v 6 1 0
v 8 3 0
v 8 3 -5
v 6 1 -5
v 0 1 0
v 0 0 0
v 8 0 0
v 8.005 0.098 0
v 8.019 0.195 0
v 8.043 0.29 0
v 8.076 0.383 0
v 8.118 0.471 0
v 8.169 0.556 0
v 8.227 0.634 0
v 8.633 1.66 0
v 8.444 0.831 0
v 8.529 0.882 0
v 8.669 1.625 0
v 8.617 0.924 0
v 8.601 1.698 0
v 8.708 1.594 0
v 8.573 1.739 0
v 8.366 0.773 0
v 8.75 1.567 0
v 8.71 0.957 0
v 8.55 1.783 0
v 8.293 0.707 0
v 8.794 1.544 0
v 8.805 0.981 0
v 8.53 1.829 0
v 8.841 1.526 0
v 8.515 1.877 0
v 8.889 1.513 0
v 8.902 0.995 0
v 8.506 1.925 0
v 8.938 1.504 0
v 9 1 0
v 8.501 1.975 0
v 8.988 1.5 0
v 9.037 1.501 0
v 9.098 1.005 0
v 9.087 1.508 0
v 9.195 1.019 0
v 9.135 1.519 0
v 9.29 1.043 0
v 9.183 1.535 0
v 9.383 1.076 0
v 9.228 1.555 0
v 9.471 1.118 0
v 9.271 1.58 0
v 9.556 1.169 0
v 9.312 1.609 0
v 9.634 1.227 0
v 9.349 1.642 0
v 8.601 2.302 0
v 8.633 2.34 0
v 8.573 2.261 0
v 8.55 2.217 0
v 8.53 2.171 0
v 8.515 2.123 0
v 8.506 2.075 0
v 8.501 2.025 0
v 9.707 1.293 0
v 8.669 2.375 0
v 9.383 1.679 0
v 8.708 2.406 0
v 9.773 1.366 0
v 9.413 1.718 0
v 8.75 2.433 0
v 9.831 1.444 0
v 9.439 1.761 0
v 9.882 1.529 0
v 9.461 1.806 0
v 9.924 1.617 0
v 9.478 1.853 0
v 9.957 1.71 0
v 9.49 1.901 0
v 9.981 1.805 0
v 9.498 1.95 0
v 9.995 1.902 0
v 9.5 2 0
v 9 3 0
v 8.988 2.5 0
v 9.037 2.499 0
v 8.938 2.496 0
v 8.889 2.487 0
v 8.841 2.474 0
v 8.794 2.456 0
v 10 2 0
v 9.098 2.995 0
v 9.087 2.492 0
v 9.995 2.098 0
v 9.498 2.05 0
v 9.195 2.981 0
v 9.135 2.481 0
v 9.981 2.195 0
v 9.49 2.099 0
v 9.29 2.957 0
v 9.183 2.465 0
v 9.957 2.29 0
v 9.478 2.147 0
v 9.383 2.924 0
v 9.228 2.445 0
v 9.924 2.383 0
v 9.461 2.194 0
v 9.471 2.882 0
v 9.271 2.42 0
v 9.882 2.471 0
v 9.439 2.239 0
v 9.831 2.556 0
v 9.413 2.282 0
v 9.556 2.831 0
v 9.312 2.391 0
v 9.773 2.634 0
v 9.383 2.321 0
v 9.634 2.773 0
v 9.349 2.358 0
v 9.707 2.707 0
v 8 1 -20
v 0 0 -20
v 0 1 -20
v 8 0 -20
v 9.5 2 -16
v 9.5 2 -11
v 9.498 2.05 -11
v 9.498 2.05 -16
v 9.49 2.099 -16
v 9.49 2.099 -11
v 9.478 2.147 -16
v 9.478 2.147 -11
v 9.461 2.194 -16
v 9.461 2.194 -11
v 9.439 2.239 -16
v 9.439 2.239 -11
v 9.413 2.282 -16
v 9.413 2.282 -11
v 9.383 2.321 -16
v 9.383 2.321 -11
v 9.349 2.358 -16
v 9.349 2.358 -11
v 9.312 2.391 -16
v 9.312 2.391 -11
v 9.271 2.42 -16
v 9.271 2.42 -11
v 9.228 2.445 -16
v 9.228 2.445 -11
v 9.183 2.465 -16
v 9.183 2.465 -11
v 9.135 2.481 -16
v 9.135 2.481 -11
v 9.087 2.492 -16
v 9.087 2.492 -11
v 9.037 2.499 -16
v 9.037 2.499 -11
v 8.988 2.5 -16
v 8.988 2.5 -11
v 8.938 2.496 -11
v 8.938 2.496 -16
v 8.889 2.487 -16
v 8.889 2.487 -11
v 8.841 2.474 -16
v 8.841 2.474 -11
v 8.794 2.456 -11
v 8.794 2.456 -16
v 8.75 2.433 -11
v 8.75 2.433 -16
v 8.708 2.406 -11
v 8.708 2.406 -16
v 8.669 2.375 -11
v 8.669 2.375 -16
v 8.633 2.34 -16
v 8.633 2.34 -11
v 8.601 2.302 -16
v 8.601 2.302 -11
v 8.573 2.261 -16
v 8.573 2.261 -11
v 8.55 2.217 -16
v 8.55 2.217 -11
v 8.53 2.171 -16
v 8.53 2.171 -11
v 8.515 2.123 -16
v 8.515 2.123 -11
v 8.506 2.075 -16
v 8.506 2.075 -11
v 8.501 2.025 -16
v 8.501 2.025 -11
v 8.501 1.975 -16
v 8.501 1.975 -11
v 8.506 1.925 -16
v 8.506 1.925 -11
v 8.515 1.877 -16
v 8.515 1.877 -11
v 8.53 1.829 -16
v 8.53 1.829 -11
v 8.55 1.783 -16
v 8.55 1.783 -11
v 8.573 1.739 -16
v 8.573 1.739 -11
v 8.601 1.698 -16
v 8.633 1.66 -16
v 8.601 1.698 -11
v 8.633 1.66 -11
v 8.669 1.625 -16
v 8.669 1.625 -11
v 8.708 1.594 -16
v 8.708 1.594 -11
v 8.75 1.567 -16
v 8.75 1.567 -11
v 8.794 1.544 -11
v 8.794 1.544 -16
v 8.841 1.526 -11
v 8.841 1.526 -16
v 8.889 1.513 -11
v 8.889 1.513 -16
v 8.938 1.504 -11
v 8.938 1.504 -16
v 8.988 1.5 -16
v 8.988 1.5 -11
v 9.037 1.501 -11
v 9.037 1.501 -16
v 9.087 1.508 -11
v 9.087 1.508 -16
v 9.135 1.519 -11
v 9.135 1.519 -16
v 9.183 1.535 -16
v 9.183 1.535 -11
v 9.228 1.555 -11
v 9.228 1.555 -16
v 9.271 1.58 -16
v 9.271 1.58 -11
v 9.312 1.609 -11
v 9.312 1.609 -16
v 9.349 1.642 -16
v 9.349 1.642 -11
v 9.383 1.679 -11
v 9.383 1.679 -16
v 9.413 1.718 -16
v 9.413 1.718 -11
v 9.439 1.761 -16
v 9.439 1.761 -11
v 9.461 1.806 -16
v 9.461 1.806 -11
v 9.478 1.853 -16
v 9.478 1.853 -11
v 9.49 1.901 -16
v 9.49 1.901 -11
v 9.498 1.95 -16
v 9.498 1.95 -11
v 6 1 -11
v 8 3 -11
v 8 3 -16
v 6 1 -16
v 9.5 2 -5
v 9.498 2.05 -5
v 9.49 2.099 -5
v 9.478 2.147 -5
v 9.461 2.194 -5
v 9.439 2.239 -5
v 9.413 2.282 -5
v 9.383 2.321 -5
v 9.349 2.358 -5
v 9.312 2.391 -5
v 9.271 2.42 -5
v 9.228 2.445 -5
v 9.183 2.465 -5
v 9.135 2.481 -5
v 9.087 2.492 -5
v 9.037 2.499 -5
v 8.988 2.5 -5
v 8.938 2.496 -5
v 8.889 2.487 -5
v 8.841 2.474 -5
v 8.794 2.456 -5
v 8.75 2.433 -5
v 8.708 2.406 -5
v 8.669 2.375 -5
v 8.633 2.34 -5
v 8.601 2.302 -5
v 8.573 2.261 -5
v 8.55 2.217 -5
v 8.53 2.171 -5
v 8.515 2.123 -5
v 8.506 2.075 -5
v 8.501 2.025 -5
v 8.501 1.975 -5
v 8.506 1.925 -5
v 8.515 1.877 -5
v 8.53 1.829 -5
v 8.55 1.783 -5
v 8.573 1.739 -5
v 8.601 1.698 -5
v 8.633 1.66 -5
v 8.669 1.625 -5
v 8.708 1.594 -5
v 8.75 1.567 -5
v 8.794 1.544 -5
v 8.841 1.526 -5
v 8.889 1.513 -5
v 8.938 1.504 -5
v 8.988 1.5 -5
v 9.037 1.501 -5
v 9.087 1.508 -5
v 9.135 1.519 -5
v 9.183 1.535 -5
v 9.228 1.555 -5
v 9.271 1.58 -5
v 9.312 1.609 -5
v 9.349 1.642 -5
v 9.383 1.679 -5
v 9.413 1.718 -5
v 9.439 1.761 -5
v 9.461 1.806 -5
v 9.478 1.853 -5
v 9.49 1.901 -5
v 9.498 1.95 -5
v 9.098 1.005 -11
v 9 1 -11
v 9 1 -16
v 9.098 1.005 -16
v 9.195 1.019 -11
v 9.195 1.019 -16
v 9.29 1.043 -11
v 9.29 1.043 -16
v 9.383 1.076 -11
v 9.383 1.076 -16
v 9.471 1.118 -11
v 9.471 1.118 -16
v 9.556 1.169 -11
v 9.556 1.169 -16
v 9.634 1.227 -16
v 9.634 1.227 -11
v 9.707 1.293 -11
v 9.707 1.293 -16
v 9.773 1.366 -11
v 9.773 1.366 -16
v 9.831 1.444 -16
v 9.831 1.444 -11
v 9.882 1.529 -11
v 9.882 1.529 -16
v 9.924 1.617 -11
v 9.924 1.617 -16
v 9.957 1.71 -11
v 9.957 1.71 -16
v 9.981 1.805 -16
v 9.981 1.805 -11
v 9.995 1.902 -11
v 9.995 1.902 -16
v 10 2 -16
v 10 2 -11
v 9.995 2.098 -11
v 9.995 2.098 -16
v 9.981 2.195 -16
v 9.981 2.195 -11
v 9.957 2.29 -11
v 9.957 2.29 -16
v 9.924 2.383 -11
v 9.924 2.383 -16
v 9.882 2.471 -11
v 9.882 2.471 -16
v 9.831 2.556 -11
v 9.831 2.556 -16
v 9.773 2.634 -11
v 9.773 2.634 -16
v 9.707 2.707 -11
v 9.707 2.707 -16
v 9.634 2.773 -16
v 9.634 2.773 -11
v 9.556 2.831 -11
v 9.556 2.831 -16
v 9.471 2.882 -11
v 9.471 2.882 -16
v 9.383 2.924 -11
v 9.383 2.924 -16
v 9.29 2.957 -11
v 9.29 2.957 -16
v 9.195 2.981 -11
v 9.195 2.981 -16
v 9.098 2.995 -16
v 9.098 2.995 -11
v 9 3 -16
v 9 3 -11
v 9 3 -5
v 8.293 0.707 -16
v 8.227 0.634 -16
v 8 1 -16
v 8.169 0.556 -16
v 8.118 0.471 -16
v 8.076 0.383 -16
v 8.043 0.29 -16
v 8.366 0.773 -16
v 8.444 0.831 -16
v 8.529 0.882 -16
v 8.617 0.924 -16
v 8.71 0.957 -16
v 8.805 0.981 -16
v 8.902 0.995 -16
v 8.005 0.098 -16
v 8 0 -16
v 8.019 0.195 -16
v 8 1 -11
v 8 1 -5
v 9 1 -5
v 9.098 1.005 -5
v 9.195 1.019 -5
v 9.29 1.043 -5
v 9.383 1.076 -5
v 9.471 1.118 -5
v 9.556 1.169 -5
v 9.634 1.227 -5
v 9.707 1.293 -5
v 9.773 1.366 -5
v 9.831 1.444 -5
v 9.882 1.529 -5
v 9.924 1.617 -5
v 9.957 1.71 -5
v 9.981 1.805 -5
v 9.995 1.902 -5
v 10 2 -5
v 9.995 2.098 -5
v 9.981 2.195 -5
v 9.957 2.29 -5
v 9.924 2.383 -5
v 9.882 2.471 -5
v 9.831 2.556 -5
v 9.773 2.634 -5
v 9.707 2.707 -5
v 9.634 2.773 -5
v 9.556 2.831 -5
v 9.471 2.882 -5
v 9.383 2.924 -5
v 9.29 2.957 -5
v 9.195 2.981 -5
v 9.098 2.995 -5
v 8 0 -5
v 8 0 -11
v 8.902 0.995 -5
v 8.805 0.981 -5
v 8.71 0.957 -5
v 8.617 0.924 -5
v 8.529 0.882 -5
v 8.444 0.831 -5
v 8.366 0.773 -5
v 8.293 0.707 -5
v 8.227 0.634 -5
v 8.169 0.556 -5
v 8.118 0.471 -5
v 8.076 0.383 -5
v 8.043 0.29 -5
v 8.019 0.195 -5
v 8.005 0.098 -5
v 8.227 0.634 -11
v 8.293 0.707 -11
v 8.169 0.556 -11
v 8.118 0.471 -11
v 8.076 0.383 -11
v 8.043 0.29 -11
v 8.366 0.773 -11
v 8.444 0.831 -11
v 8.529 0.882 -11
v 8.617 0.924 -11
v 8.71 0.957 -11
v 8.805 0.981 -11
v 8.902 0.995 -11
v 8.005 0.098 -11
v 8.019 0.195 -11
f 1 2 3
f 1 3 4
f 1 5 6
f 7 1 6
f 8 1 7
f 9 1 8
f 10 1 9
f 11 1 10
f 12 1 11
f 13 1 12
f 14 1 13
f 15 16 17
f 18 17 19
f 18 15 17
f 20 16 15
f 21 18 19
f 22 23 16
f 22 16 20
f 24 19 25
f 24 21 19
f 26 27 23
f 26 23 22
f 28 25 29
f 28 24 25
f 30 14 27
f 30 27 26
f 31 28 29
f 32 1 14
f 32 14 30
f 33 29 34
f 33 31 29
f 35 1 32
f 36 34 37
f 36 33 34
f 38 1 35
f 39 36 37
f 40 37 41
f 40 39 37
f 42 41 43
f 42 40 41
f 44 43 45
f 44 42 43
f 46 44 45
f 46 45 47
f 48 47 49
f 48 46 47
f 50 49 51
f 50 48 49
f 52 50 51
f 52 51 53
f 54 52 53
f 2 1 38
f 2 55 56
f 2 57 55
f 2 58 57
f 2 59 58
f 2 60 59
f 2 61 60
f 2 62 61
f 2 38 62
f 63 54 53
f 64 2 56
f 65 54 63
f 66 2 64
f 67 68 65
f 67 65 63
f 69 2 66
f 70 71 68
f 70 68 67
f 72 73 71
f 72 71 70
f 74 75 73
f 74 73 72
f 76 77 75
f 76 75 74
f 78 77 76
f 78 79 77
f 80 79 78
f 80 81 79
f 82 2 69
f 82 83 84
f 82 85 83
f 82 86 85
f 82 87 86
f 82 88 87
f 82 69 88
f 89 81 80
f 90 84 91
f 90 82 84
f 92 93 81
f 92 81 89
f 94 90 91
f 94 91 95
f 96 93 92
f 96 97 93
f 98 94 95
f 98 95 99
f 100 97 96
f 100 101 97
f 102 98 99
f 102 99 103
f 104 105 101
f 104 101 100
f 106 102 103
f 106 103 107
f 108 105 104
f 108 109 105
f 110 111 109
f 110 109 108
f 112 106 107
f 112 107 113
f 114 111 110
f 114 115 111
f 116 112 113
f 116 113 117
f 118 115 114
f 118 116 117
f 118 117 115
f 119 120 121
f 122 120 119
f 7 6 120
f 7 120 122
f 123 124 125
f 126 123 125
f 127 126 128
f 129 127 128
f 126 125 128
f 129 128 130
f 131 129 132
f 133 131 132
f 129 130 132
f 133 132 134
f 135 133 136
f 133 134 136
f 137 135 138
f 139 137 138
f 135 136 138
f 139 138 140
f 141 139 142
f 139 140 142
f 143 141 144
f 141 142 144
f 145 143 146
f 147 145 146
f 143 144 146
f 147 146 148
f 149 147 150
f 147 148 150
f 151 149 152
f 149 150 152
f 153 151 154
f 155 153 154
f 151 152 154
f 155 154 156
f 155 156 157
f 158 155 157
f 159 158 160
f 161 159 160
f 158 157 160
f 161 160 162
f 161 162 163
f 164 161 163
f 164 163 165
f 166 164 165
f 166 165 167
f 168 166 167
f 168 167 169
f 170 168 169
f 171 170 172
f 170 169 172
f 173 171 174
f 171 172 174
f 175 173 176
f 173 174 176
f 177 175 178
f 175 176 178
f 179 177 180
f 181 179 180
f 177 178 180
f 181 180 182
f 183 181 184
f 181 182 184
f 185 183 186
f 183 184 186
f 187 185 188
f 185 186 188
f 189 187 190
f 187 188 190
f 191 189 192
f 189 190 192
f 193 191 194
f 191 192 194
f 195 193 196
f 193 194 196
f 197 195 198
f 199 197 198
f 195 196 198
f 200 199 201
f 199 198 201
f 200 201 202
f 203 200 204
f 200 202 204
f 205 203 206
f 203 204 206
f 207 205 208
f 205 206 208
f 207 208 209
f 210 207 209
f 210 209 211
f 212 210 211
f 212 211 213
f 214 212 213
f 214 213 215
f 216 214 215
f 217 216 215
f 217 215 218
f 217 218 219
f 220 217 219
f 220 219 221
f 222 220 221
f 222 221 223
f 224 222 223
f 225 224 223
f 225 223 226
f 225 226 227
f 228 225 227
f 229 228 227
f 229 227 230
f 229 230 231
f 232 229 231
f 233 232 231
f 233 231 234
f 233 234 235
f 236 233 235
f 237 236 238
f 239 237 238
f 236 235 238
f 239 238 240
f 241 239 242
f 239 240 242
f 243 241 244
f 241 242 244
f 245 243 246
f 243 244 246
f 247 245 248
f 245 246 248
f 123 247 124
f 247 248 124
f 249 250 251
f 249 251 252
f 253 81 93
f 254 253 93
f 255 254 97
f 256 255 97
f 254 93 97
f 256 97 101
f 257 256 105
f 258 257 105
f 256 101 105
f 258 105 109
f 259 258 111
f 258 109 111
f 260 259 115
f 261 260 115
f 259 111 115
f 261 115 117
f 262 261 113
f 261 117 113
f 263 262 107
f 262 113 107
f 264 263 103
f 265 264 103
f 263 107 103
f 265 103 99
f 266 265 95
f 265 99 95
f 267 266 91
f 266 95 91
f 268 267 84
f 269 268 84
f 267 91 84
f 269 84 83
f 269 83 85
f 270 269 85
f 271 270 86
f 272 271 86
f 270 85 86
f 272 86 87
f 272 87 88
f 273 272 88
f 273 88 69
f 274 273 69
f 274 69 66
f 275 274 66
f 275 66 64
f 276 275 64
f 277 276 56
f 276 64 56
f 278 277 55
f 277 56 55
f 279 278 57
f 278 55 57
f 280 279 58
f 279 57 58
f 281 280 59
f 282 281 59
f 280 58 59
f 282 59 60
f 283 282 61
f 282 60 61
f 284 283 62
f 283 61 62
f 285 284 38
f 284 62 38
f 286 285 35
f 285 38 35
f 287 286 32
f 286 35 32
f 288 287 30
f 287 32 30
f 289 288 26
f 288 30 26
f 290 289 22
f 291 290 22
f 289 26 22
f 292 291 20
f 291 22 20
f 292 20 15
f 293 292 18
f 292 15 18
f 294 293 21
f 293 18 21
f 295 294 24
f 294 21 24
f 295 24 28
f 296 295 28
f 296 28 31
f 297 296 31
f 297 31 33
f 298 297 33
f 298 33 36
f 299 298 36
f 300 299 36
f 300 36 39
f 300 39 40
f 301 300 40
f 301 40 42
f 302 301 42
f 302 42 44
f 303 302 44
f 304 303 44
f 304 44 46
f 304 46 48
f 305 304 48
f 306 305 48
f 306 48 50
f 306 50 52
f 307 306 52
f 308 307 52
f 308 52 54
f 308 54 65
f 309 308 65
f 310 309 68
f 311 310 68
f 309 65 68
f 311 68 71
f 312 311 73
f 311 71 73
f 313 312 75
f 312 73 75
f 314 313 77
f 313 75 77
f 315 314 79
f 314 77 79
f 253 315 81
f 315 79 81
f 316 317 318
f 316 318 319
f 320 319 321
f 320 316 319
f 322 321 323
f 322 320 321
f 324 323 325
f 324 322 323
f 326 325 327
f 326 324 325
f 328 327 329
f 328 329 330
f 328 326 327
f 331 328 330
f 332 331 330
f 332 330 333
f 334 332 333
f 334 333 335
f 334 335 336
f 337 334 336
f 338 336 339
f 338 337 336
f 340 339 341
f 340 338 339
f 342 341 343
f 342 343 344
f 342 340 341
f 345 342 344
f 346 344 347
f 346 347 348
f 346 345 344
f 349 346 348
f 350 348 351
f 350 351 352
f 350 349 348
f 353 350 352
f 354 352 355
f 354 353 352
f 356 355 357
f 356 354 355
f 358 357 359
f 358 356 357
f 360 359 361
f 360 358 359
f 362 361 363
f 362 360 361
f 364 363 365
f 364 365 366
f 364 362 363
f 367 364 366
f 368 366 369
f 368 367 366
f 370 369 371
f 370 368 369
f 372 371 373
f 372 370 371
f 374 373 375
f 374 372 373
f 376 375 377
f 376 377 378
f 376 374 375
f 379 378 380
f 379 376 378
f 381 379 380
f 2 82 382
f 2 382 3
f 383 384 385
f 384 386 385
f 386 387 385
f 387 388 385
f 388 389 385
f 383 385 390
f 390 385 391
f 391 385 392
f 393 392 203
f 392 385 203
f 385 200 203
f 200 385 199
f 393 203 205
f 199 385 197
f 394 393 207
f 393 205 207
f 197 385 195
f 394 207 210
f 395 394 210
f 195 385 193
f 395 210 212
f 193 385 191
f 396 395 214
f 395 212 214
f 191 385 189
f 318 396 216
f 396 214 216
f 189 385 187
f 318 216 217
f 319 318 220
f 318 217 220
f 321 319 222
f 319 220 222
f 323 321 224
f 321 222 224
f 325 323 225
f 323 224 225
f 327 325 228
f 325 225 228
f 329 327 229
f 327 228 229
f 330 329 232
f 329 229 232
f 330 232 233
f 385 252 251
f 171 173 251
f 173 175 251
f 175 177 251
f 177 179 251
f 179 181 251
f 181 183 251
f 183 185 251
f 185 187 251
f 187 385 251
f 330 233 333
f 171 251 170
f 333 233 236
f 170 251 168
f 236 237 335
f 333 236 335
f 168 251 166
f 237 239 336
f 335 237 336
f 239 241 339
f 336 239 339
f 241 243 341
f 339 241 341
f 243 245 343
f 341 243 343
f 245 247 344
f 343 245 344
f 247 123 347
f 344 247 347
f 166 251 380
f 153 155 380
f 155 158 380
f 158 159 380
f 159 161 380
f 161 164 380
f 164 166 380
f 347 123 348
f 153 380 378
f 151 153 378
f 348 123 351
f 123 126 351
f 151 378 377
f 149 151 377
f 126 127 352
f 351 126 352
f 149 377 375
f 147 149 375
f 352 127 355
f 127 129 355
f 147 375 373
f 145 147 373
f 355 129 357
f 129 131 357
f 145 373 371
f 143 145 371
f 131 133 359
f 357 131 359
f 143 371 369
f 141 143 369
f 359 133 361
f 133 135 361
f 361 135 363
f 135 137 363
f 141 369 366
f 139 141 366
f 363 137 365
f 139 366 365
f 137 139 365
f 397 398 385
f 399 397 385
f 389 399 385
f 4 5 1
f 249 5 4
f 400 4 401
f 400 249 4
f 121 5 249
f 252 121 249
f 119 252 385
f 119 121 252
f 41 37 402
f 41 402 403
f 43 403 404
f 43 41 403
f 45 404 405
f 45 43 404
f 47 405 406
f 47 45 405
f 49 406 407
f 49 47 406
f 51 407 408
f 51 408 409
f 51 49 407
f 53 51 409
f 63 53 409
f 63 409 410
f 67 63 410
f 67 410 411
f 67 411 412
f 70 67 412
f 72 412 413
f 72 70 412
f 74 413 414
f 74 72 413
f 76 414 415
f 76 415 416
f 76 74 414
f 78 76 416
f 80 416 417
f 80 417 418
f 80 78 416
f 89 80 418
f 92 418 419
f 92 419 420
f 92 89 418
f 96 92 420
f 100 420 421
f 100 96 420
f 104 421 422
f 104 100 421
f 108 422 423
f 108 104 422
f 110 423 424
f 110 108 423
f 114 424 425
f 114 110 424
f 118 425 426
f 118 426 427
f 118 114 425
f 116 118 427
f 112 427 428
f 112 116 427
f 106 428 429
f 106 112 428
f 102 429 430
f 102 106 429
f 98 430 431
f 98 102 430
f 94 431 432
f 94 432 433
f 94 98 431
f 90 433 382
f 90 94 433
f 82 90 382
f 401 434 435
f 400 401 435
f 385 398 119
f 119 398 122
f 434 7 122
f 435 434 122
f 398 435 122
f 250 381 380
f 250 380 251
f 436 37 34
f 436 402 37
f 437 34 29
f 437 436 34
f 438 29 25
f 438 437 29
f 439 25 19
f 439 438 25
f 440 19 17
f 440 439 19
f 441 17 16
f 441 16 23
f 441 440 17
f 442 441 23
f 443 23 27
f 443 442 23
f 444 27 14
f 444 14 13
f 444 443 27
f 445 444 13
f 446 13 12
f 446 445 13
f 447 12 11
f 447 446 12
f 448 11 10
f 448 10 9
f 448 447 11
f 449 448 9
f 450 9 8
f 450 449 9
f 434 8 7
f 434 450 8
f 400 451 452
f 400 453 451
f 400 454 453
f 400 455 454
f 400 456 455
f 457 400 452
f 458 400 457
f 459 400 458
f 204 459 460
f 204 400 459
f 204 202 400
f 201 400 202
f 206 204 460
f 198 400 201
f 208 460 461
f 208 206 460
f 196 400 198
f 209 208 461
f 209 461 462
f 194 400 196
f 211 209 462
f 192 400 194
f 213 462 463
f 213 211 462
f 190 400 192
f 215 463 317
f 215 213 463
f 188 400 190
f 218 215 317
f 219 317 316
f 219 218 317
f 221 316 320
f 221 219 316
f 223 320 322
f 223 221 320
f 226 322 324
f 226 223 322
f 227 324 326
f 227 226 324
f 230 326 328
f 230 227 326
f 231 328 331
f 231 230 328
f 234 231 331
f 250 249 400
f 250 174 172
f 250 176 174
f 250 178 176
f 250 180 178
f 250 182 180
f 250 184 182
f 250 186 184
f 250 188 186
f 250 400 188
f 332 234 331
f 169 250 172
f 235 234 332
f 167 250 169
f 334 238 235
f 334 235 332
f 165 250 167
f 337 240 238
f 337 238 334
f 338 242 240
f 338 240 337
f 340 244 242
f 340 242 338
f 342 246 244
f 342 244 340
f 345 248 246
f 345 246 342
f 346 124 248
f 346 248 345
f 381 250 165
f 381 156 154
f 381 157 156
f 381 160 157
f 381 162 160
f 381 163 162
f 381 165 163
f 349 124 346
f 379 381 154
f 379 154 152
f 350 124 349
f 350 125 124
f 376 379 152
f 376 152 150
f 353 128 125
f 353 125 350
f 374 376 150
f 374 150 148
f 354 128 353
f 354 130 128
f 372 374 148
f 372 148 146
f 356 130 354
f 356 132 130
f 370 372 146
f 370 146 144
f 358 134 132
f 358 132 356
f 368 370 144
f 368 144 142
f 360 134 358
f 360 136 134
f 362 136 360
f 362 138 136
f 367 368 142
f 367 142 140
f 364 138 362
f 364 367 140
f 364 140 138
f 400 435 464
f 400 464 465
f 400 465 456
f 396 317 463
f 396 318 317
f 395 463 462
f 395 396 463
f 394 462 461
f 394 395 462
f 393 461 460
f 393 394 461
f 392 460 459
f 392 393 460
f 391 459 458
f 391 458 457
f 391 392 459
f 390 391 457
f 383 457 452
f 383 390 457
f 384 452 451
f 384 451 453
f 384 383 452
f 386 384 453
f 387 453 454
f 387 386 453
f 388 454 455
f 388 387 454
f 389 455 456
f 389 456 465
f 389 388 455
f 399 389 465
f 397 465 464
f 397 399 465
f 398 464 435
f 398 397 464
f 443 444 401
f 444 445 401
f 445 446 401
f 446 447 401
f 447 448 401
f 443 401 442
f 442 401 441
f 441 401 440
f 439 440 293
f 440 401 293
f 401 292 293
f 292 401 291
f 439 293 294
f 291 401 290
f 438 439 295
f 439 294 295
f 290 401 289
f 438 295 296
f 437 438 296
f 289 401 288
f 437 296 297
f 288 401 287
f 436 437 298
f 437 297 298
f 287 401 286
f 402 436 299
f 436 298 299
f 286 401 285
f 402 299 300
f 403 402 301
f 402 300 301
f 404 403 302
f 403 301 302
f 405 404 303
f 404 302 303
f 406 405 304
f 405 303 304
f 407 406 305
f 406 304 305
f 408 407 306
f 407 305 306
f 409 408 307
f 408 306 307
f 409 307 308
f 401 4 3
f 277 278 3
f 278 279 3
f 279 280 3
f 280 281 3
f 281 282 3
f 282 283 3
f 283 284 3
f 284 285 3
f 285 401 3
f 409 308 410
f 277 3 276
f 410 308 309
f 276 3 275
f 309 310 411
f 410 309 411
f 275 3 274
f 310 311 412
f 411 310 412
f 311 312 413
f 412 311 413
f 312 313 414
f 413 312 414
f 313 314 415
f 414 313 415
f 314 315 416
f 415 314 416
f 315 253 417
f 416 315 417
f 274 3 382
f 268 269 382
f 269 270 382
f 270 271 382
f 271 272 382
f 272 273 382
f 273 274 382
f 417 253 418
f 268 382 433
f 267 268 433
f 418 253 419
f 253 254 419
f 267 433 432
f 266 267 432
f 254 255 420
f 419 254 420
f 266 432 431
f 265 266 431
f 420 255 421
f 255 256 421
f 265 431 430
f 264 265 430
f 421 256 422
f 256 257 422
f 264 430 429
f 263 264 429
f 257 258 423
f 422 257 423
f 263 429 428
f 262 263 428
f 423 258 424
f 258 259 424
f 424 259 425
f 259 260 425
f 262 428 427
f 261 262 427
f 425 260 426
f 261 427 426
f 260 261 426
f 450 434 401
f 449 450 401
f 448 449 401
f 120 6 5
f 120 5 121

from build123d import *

# Parameters (mm, degrees)
SKETCH1_W              = 8
SKETCH1_H              = 20
BOSS_EXTRUDE1_DEPTH    = 1
SKETCH2_R              = 0.5
BOSS_EXTRUDE2_DEPTH    = 5
FILLET1_R              = 1
LPATTERN1_COUNT        = 2
LPATTERN1_PITCH        = 11
FILLET1_OF_LPATTERN1_R = 1


with BuildPart() as part:
    # Sketch1 → Boss-Extrude1 (new body)
    with BuildSketch(Plane(origin=(0, 0, 0), x_dir=(1, 0, 0), z_dir=(0, 1, 0))):
        with Locations((4, 10)):
            Rectangle(SKETCH1_W, SKETCH1_H)
    extrude(amount=BOSS_EXTRUDE1_DEPTH)

    # Sketch2 → Boss-Extrude2 (add)
    with BuildSketch(Plane.XY):
        with BuildLine():
            Line((8, 1), (9, 1))
            ThreePointArc((9, 1), (10, 2), (9, 3))
            Line((9, 3), (8, 3))
            Line((8, 3), (6, 1))
            Line((6, 1), (8, 1))
        make_face()
        with Locations((9, 2)):
            Circle(SKETCH2_R, mode=Mode.SUBTRACT)
    boss_extrude2 = extrude(amount=-BOSS_EXTRUDE2_DEPTH)

    # Fillet1
    fillet1_edges = [part.edges().sort_by_distance(p)[0] for p in [
        (8, 1, -2.5),
    ]]
    fillet(fillet1_edges, radius=FILLET1_R - 0.0001)  # a hair under: the kernel refuses the full size

    # LPattern1: Boss-Extrude2 ×2
    with Locations(*[(0, 0, -i * LPATTERN1_PITCH) for i in range(1, LPATTERN1_COUNT)]):
        add(boss_extrude2)

    # Fillet1 of LPattern1
    fillet1_of_lpattern1_edges = [part.edges().sort_by_distance(p)[0] for p in [
        (8, 1, -13.5),
    ]]
    fillet(fillet1_of_lpattern1_edges, radius=FILLET1_OF_LPATTERN1_R - 0.0001)  # a hair under: the kernel refuses the full size


solid = part.part
